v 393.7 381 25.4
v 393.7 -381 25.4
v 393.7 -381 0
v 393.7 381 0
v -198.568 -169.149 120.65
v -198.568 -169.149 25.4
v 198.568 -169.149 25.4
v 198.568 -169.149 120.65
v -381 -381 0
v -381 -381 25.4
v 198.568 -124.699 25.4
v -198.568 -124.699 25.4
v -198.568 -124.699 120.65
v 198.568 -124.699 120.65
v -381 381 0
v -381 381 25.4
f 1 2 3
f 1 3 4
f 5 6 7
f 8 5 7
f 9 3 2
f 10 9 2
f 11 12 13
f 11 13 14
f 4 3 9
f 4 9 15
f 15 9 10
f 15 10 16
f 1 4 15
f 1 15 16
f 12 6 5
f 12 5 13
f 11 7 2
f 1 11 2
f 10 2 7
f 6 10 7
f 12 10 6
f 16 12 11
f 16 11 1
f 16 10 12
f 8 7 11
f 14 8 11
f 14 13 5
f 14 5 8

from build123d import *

# Parameters (mm, degrees)
F0_W      = 762
F0_H      = 762
F1_DEPTH  = 25.4
F1_FACE_W = 762
F1_FACE_H = 25.4
F2_DEPTH  = 12.7
F4_W      = 397.13651
F4_H      = 44.45
F5_DEPTH  = 95.25


with BuildPart() as f1:
    # F0 (on Top) → F1 (new body)
    with BuildSketch(Plane.XY):
        Rectangle(F0_W, F0_H)
    extrude(amount=F1_DEPTH)

    # F1_face (on face) → F2 (join)
    with BuildSketch(Plane(origin=(381, 0, 12.7), x_dir=(0, 1, 0), z_dir=(1, 0, 0))):
        Rectangle(F1_FACE_W, F1_FACE_H)
    extrude(amount=F2_DEPTH)

    # F4 (on face) → F5 (join)
    with BuildSketch(Plane.XY.offset(25.4)):
        with Locations((0, -146.924108)):
            Rectangle(F4_W, F4_H)
    extrude(amount=F5_DEPTH)


solid = f1.part
